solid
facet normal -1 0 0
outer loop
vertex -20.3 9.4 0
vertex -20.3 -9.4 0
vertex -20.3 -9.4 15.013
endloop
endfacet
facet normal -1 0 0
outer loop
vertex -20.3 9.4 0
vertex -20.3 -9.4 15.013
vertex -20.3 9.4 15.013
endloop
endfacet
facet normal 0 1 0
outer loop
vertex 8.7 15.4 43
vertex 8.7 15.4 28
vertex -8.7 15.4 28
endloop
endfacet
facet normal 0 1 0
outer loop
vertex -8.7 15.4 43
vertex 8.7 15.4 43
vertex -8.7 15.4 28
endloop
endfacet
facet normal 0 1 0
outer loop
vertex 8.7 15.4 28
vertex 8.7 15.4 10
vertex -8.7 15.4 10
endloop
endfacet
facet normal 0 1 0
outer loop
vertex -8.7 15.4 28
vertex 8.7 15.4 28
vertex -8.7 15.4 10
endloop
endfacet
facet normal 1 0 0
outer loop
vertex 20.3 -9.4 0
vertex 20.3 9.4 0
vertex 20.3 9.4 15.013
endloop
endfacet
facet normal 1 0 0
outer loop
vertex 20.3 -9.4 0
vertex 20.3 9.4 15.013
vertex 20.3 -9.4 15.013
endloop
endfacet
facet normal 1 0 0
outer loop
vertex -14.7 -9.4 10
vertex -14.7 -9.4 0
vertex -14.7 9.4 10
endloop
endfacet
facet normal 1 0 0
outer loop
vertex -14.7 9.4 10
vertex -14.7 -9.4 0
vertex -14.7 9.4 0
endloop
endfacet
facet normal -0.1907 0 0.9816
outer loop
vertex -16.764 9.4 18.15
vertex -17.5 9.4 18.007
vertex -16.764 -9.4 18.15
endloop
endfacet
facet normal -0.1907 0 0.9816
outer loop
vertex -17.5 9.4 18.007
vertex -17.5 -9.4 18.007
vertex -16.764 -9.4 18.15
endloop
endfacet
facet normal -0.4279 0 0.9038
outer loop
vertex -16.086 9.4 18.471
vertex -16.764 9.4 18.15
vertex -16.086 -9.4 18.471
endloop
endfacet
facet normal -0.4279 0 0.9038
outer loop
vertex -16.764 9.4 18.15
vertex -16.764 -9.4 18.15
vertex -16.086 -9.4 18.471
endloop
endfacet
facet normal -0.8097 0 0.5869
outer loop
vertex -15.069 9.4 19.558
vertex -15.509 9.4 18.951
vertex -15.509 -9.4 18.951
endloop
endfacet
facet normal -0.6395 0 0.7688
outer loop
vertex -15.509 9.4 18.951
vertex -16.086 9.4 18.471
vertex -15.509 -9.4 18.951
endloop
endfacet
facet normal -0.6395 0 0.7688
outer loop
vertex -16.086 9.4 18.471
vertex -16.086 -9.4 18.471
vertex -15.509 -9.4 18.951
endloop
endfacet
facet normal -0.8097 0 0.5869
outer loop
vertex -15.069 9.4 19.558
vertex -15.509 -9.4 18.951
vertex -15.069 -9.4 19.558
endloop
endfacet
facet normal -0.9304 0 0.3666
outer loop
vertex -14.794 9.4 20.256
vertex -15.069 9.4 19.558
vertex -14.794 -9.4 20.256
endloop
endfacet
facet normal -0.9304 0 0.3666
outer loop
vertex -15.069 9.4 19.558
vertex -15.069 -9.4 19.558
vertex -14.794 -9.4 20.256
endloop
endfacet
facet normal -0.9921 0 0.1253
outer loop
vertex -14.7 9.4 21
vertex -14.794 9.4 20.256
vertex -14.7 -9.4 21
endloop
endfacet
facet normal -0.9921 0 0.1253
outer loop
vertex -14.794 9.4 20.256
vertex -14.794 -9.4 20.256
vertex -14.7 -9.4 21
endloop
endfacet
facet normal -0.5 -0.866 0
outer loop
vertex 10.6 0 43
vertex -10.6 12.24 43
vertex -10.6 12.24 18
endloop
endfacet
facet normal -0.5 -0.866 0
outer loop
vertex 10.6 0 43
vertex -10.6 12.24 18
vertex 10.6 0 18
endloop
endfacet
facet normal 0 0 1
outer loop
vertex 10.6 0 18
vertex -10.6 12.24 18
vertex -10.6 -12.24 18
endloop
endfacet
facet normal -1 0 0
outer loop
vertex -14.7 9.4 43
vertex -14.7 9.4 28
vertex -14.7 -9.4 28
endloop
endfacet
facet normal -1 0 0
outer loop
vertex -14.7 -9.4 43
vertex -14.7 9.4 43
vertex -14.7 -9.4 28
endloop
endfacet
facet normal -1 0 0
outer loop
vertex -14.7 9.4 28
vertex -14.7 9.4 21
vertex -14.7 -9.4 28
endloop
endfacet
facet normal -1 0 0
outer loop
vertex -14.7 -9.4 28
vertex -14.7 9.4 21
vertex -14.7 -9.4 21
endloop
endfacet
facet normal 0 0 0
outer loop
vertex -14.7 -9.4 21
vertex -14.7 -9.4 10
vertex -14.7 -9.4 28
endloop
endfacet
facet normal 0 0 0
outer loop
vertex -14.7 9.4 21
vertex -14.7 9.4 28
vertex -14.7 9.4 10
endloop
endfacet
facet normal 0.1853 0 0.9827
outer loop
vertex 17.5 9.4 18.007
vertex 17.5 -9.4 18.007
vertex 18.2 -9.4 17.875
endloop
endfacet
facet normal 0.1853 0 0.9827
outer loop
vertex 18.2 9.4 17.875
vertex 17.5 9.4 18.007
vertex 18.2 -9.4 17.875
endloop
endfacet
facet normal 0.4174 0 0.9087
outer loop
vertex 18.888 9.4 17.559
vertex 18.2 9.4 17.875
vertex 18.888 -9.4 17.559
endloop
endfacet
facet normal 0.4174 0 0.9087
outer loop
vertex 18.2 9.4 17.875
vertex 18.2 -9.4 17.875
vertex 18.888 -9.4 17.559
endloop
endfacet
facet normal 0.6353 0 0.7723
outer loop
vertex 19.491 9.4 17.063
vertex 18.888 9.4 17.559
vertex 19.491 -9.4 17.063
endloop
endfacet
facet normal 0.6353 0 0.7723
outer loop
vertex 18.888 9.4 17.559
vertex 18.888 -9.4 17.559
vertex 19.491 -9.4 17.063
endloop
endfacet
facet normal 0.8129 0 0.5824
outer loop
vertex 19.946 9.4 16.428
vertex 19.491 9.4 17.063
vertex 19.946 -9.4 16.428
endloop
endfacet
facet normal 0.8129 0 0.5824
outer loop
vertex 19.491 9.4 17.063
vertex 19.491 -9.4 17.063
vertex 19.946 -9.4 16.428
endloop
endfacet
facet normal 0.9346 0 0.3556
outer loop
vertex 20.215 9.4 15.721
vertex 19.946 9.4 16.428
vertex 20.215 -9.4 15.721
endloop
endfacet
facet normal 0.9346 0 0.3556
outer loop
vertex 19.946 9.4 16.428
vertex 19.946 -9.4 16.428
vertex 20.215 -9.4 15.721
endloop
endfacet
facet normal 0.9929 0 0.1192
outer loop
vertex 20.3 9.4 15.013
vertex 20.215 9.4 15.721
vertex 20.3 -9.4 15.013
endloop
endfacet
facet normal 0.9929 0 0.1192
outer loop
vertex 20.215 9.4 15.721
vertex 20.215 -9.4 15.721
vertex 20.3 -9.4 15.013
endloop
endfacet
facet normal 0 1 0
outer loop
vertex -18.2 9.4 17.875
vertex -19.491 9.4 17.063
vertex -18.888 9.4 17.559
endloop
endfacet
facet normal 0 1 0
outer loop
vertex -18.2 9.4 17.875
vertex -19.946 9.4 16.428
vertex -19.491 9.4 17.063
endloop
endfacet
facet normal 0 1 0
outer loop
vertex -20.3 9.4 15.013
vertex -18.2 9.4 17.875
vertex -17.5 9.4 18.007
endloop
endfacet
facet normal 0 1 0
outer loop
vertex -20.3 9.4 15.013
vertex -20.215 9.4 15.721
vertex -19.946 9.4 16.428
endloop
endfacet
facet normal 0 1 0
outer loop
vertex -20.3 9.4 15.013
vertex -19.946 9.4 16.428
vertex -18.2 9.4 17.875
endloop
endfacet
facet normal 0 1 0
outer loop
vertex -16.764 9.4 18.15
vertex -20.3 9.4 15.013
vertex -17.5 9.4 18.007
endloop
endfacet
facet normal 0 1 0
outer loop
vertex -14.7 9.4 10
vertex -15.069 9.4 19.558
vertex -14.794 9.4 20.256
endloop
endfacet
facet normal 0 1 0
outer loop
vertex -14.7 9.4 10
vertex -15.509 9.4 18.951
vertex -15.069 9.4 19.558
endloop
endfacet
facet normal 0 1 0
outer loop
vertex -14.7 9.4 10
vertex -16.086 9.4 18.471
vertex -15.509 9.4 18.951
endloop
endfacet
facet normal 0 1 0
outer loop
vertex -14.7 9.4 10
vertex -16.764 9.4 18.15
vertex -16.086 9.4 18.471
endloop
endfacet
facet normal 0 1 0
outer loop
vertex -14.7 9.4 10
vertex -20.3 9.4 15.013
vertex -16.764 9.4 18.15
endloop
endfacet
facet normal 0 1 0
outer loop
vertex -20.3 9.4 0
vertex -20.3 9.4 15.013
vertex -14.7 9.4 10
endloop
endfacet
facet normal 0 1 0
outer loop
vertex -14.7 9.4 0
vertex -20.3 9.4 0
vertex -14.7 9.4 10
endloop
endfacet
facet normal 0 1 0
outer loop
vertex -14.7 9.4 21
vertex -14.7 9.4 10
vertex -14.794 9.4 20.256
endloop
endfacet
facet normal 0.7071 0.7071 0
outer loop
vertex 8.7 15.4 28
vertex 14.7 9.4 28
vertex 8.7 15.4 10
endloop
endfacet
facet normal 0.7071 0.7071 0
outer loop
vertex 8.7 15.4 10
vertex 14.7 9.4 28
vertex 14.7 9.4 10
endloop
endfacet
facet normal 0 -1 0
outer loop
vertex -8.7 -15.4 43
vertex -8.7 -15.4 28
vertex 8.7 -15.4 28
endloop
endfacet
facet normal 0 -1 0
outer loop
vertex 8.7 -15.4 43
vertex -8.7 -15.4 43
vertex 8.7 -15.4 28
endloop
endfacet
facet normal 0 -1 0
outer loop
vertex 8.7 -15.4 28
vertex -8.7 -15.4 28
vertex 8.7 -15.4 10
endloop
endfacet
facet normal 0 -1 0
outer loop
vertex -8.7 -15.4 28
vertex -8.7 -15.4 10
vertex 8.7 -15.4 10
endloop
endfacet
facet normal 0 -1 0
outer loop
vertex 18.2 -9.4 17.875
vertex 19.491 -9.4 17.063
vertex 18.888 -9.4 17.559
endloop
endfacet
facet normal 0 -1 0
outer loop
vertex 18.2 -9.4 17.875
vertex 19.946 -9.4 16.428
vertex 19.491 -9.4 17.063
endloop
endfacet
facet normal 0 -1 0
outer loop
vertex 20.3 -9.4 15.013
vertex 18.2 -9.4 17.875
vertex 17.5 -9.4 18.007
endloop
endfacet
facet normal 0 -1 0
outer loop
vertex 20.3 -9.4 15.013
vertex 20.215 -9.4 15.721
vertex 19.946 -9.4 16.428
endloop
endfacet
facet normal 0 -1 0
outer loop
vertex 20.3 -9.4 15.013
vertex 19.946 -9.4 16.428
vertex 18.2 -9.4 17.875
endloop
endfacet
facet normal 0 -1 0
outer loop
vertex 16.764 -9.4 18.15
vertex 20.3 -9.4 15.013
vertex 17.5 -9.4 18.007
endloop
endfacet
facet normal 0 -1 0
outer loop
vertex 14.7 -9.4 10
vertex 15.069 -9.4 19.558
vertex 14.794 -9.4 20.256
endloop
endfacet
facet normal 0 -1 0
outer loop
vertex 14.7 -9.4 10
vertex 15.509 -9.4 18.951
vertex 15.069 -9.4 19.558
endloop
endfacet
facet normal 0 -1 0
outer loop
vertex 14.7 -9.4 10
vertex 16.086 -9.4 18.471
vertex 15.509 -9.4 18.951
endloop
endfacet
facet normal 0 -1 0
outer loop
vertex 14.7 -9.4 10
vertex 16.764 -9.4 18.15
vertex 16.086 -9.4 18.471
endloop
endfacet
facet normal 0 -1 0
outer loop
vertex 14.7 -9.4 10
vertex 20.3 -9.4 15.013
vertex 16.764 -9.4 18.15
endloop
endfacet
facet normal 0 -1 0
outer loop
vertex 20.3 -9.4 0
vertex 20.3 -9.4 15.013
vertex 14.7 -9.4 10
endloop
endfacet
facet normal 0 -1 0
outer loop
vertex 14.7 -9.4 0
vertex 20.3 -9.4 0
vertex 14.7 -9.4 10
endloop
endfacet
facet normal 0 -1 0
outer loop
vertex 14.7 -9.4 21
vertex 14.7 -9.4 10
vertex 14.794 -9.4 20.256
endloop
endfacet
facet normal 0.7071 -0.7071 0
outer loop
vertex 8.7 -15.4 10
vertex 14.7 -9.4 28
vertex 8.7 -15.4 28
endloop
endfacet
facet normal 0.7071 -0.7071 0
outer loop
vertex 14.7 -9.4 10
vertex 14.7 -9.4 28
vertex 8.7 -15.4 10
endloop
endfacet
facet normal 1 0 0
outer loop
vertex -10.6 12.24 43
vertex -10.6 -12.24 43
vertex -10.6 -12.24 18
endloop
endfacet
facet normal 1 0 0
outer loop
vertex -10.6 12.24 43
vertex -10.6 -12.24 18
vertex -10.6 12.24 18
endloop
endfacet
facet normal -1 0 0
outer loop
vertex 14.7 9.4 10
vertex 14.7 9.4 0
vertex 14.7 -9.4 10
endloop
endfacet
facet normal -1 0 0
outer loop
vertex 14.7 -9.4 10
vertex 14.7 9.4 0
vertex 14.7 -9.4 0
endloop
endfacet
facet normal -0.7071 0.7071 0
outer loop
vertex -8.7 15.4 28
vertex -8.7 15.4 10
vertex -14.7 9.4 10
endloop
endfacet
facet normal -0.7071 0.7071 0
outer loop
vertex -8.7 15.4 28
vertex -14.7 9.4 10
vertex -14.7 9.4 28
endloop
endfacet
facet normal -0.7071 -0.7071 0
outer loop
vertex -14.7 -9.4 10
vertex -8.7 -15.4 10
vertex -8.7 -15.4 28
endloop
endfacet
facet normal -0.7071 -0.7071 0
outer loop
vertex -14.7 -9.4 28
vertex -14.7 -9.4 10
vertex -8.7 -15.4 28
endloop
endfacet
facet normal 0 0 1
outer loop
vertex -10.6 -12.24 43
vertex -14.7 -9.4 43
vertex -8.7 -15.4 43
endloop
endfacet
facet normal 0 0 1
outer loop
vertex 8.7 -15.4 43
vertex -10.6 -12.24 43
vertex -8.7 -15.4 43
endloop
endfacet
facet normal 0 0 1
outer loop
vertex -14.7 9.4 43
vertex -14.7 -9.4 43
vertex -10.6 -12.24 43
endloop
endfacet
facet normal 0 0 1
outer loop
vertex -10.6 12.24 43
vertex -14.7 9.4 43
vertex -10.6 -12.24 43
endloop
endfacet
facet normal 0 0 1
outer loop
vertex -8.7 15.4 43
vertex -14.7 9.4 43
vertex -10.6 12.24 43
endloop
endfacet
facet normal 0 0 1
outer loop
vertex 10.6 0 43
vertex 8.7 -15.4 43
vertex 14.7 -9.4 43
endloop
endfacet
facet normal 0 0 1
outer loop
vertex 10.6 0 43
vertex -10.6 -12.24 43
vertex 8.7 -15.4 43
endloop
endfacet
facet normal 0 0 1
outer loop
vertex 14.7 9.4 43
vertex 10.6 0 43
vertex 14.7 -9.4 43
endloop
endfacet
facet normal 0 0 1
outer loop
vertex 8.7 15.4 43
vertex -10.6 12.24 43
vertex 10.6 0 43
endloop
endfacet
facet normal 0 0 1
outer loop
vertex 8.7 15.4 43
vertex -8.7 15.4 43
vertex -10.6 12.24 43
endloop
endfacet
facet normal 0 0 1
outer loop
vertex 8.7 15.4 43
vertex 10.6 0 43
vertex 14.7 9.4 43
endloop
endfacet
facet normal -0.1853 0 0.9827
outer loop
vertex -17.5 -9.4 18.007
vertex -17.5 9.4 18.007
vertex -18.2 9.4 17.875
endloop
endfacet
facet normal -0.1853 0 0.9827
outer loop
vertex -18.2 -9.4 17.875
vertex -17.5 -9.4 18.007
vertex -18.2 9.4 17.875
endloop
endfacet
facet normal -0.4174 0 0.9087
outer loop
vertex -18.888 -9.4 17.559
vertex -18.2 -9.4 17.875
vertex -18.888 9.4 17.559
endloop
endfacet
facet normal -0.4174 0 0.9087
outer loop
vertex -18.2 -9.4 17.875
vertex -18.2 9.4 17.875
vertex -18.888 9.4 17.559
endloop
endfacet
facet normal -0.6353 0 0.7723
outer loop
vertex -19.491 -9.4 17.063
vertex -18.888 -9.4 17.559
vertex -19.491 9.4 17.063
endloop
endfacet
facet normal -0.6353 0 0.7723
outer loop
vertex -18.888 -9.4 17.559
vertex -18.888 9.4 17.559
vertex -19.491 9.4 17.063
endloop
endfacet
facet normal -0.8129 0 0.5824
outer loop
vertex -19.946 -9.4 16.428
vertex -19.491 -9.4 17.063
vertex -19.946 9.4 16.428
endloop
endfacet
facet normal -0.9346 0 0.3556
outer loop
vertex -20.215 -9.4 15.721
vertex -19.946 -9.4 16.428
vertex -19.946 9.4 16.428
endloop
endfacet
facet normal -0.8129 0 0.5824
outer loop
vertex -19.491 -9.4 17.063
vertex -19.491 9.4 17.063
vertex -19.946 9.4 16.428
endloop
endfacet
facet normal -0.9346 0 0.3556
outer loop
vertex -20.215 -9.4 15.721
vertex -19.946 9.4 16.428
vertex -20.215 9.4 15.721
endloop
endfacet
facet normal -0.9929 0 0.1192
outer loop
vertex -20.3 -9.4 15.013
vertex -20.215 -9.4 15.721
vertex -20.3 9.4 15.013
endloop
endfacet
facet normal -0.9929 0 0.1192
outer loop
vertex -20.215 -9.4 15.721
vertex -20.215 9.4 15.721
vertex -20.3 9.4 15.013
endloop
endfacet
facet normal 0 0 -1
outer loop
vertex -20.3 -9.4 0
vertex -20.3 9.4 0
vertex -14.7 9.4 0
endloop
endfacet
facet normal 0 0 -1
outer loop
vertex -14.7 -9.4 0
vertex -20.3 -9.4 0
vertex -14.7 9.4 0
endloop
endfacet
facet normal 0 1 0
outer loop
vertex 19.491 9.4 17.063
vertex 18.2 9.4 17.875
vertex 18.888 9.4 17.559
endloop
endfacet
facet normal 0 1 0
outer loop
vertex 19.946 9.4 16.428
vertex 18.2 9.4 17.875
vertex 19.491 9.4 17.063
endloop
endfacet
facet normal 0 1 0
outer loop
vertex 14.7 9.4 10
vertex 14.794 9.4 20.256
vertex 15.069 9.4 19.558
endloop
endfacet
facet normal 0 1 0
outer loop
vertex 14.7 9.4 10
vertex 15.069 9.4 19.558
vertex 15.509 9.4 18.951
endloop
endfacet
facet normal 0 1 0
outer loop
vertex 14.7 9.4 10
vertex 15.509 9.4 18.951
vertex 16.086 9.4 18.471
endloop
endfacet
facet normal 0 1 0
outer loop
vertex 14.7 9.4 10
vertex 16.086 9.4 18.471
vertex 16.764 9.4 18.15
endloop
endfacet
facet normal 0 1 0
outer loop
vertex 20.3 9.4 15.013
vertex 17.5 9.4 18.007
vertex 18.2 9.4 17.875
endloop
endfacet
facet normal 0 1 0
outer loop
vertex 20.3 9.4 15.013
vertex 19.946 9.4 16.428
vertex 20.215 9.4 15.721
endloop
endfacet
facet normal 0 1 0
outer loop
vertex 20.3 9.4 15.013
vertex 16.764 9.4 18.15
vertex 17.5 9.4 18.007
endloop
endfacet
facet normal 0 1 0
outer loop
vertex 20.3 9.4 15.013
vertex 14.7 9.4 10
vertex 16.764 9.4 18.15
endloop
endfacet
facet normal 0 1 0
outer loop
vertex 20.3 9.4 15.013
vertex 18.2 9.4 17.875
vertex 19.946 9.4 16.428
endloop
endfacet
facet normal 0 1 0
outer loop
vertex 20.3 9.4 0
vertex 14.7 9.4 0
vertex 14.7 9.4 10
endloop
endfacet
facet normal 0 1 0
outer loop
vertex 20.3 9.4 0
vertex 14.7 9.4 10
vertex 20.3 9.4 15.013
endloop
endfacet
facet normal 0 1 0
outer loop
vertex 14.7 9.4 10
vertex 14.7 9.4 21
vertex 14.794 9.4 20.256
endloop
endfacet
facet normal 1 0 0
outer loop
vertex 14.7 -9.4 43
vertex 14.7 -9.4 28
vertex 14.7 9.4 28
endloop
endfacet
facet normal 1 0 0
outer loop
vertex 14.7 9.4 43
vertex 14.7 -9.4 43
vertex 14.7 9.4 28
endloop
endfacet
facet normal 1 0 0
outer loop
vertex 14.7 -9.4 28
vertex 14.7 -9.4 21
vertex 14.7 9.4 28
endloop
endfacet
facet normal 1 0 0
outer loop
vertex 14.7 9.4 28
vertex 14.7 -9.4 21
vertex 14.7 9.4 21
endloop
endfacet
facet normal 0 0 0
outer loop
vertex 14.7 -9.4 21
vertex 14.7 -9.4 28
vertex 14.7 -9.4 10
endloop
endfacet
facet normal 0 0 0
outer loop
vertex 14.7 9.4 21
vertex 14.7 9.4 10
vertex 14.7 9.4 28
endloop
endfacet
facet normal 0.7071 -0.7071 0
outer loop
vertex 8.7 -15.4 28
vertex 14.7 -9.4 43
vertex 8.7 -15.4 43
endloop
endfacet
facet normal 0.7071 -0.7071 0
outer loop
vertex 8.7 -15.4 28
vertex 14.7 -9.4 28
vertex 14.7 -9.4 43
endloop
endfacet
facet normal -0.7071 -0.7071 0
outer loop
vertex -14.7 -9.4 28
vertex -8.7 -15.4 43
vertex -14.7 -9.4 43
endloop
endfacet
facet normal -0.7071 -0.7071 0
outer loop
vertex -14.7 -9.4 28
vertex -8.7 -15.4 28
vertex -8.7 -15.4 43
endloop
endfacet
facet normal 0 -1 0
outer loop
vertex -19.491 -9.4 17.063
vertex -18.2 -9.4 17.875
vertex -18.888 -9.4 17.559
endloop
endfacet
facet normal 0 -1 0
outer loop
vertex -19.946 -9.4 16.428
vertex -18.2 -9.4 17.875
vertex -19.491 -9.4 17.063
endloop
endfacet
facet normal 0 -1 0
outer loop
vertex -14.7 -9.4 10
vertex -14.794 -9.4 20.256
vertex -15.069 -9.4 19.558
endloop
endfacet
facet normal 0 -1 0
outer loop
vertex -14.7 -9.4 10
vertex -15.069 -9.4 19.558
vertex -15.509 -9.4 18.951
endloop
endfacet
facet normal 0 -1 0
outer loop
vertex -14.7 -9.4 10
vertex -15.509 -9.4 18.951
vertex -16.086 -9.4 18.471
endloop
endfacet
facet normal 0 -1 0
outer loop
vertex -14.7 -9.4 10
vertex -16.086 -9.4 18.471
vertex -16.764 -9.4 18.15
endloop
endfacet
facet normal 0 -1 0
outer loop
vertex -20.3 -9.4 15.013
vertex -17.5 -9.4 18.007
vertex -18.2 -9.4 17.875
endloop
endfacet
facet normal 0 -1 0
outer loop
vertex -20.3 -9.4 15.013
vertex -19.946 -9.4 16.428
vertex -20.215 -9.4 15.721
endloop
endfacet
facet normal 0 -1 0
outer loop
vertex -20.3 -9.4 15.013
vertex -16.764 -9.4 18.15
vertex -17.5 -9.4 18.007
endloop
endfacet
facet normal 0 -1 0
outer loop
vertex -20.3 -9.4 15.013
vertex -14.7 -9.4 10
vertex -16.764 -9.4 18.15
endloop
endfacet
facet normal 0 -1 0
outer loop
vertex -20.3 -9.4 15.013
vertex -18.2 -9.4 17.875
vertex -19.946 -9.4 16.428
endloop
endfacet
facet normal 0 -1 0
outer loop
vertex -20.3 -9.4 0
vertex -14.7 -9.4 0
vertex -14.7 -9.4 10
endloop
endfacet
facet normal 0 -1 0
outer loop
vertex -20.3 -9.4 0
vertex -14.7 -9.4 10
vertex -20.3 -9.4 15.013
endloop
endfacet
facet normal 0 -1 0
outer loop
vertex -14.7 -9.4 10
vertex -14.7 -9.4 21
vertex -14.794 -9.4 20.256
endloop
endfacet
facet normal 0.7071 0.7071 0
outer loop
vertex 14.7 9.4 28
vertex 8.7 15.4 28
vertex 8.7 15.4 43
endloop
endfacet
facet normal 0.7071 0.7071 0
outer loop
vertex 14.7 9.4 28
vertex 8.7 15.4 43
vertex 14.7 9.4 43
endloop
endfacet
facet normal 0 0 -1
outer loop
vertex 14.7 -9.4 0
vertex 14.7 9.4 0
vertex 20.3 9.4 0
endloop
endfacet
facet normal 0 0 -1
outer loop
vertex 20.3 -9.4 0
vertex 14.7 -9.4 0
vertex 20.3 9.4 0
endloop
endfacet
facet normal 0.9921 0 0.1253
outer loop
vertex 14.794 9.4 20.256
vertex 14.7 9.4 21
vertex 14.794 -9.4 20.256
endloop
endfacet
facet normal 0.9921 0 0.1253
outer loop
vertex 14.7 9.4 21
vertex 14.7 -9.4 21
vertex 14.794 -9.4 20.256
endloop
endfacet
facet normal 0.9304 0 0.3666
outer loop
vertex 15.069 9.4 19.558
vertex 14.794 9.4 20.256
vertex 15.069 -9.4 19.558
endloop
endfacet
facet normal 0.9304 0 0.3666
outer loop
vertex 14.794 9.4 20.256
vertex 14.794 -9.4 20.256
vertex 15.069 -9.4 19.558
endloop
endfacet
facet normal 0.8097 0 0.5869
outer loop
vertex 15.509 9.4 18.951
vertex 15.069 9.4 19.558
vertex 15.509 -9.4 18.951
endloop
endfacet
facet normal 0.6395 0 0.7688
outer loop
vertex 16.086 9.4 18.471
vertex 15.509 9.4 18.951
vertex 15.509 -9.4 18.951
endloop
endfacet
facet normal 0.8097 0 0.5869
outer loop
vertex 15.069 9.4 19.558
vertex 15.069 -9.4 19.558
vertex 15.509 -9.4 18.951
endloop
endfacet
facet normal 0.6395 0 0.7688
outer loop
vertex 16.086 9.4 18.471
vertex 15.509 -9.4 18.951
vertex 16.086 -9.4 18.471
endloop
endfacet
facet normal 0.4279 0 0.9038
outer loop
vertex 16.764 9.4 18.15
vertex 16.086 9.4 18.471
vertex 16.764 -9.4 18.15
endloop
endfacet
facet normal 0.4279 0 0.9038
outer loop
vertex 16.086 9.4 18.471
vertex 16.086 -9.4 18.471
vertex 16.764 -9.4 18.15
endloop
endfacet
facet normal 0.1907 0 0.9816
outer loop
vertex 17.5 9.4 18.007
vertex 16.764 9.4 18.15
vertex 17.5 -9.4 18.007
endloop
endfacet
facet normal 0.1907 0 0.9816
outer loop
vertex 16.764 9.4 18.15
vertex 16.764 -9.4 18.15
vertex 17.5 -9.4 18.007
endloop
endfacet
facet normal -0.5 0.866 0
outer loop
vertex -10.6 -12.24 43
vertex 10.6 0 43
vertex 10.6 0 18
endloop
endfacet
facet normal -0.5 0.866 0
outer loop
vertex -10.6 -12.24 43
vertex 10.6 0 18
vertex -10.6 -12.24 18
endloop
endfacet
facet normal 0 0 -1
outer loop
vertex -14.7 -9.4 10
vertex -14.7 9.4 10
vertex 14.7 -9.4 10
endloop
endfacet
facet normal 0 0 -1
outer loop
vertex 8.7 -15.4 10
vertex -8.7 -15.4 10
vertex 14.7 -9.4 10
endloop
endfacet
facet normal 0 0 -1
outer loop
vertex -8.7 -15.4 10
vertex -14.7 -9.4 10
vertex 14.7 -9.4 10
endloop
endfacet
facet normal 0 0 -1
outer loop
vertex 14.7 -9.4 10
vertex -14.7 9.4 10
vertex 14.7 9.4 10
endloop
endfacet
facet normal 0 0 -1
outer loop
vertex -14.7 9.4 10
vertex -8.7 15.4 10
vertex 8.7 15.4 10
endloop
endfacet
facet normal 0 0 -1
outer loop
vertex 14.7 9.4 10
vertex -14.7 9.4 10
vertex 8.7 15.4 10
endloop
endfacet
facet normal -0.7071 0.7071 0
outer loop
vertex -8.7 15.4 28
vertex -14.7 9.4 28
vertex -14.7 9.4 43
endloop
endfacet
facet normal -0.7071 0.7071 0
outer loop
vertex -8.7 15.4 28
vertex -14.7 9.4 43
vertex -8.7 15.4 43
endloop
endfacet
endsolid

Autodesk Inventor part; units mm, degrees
ref_plane "YZ Plane" through (0, 0, 0) normal (1, 0, 0) x (0, 1, 0)
ref_plane "XZ Plane" through (0, 0, 0) normal (0, 1, 0) x (-1, 0, 0)
ref_plane "XY Plane" through (0, 0, 0) normal (0, 0, 1) x (1, 0, 0)
sketch "Sketch1" plane through (0, 0, 0) normal (0, 0, 1) x (1, 0, 0)
  line L0 (-20.3, 9.4) -> (20.3, 9.4)
  line L1 (20.3, 9.4) -> (20.3, -9.4)
  line L2 (20.3, -9.4) -> (-20.3, -9.4)
  line L3 (-20.3, -9.4) -> (-20.3, 9.4)
  line L4 (-14.7, 9.4) -> (14.7, 9.4)
  line L5 (14.7, 9.4) -> (14.7, -9.4)
  line L6 (14.7, -9.4) -> (-14.7, -9.4)
  line L7 (-14.7, -9.4) -> (-14.7, 9.4)
  point P0 (0, 0)
  point P1 (14.7, 9.4)
  dimension "d0" = 29.4
  dimension "d1" = 18.8
  dimension "d2" = 9.4
  dimension "d3" = 14.7
  dimension "d4" = 5.6
  dimension "d5" = 5.6
extrude "Extrusion1" add sketch "Sketch1" along normal blind 18
extrude "Extrusion2" cut sketch "Sketch1" along normal blind 10 contours L0 L5 L2 L7
sketch "Sketch2" plane through (0, 0, 18) normal (0, 0, 1) x (1, 0, 0)
  line L0 (10.6, 0) -> (-10.6, 12.2398)
  line L1 (-10.6, 12.2398) -> (-10.6, -12.2398)
  line L2 (14.7, 9.4) -> (-14.7, 9.4) projected
  line L3 (-10.6, -12.2398) -> (10.6, 0)
  line L4 (-20.3, 9.4) -> (-20.3, -9.4) projected
  line L5 (14.7, -9.4) -> (14.7, 9.4) projected
  line L6 (-14.7, 9.4) -> (-14.7, -9.4) projected
  line L7 (14.7, -9.4) -> (-14.7, -9.4)
  line L8 (-14.7, -9.4) -> (-14.7, -15.4)
  line L9 (-14.7, -15.4) -> (14.7, -15.4)
  line L10 (14.7, -15.4) -> (14.7, -9.4)
  line L11 (14.7, 9.4) -> (-14.7, 9.4)
  line L12 (-14.7, 9.4) -> (-14.7, 15.4)
  line L13 (-14.7, 15.4) -> (14.7, 15.4)
  line L14 (14.7, 15.4) -> (14.7, 9.4)
  point P0 (0, 0)
  point P1 (-10.6, 0)
  point P2 (0, -6.1199)
  point P3 (0, 6.1199)
  point P4 (-14.7, 9.4)
  point P5 (-14.7, -9.4)
  point P6 (-5.6813, -9.4)
  point P7 (-10.6, -9.4)
  point P8 (-10.6, 9.4)
  point P9 (-5.6813, 9.4)
  dimension "d17" = 21.2
  dimension "d18" = 0
  dimension "d19" = 21.2
  dimension "d20" = 21.2
  dimension "d21" = 10.6
  dimension "d25" = 6
  dimension "d26" = 6
  dimension "d27" = 0
  dimension "d28" = 0
extrude "Extrusion3" add sketch "Sketch2" along normal blind 10 and the other way blind 8 contours L0 L2 L5 L7 L3 | L0 L1 L2 L12 L13 L14 | L7 L10 L9 L8 L1 L3 | L1 L7 L6 L2
extrude "Extrusion4" add sketch "Sketch2" against normal blind 8 contours L2 L1 L0 | L3 L1 L7
chamfer "Chamfer1" distance 6 angle 45 4 edges at (-14.7, 15.4, 19) (-14.7, -15.4, 19) (14.7, -15.4, 19) (14.7, 15.4, 19)
fillet "Fillet1" radius 3 4 edges at (14.7, 0, 18) (-14.7, 0, 18) (-20.3, 0, 18) (20.3, 0, 18)
sketch "Sketch4" plane through (0, 0, 28) normal (0, 0, 1) x (1, 0, 0)
  line L0 (8.7, 15.4) -> (14.7, 9.4) projected
  line L1 (8.7, 15.4) -> (-8.7, 15.4) projected
  line L2 (-14.7, 9.4) -> (-8.7, 15.4) projected
  line L3 (-14.7, 9.4) -> (-14.7, -9.4) projected
  line L4 (-8.7, -15.4) -> (-14.7, -9.4) projected
  line L5 (-8.7, -15.4) -> (8.7, -15.4) projected
  line L6 (14.7, -9.4) -> (8.7, -15.4) projected
  line L7 (14.7, -9.4) -> (14.7, 9.4) projected
  line L8 (-10.6, 12.2398) -> (10.6, 0) projected
  line L9 (10.6, 0) -> (-10.6, -12.2398) projected
  line L10 (-10.6, -12.2398) -> (-10.6, 12.2398) projected
  point P0 (0, 0)
extrude "Extrusion5" add sketch "Sketch4" along normal blind 15
equation "\"d2\" = 0.5 * d1"
equation "\"d3\" = 0.5 * d0"
equation "\"d5\" = d4"
properties part number "CameraSupportTemp"
